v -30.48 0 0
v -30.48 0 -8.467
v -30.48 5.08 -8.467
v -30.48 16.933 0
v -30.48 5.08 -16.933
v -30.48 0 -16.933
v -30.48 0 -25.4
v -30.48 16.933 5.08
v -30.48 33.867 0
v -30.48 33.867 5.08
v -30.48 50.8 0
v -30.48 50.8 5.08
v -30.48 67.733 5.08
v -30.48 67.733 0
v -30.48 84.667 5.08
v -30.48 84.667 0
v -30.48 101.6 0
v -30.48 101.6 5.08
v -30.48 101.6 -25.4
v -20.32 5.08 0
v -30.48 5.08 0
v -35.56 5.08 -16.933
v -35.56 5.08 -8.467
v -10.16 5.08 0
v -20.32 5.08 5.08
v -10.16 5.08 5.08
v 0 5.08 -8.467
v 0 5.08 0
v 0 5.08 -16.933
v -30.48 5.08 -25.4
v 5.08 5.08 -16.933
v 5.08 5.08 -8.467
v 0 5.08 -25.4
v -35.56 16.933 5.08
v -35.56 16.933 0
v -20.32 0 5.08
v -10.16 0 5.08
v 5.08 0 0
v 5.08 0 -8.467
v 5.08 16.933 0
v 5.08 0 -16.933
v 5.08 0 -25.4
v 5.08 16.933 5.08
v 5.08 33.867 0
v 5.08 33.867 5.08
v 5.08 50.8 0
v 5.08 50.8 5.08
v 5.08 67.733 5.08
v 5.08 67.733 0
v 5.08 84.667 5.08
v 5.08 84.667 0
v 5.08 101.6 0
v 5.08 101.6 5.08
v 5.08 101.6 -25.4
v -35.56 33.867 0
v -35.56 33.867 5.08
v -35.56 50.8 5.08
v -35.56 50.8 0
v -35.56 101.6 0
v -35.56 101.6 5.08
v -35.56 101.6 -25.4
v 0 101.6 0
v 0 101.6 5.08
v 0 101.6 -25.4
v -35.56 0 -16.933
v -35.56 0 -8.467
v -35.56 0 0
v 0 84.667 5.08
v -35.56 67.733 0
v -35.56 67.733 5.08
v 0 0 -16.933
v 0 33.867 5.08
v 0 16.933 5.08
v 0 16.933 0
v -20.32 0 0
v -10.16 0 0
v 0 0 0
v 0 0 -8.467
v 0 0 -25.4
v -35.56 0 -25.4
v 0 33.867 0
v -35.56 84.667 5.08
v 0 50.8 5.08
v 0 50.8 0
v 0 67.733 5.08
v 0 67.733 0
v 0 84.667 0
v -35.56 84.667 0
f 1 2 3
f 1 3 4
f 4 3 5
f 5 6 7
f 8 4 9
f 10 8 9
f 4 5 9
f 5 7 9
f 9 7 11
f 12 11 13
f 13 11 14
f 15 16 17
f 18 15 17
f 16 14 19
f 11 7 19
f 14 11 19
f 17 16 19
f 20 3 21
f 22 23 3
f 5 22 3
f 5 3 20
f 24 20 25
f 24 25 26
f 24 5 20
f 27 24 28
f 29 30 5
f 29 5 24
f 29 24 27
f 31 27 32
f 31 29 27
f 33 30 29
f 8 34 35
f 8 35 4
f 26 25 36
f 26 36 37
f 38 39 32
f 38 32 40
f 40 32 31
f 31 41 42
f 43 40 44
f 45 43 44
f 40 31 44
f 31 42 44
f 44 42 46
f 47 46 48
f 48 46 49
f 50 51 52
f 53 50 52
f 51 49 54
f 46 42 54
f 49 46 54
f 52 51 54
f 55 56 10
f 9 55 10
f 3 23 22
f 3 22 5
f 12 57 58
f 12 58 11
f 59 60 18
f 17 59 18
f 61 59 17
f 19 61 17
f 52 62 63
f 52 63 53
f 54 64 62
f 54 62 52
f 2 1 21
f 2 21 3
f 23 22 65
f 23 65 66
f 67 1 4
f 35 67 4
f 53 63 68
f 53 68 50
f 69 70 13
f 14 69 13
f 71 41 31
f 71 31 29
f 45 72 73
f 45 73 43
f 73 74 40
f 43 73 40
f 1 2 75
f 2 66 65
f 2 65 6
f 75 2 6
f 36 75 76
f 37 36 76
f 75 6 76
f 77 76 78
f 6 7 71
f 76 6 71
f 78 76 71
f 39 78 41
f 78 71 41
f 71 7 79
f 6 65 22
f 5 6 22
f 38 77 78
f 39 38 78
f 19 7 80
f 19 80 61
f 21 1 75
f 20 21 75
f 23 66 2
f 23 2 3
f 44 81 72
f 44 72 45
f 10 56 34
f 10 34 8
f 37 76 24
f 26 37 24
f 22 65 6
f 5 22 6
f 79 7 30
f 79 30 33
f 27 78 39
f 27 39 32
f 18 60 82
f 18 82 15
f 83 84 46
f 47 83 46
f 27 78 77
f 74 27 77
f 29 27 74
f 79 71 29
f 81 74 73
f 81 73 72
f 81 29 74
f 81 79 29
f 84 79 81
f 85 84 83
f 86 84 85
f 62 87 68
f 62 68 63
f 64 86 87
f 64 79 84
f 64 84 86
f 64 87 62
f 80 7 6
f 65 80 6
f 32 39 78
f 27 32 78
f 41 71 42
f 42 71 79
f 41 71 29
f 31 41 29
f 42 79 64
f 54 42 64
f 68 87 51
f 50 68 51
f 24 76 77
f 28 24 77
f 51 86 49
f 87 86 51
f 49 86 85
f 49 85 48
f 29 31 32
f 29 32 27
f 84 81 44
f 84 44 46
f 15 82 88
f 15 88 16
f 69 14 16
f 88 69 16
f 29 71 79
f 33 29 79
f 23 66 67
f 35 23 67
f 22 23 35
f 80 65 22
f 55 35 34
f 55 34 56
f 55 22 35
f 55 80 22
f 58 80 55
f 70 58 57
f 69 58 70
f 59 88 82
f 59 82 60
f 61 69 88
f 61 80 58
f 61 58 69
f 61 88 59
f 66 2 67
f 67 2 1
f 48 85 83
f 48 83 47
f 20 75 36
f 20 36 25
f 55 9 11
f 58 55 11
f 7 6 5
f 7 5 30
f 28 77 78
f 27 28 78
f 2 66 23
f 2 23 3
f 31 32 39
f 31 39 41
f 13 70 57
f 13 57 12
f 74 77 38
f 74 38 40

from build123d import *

# Parameters (mm, degrees)
SKETCH1_W           = 30.48
SKETCH1_H           = 25.4
BOSS_EXTRUDE1_DEPTH = 5.08
SKETCH2_W           = 8.466666666
SKETCH2_H           = 5.08
BOSS_EXTRUDE2_DEPTH = 5.08
SKETCH3_W           = 8.466666666
SKETCH3_H           = 5.08
BOSS_EXTRUDE3_DEPTH = 5.08
SKETCH4_W           = 25.4
SKETCH4_H           = 101.6
BOSS_EXTRUDE4_DEPTH = 5.08
SKETCH5_W           = 5.08
SKETCH5_H           = 8.466666666
CUT_EXTRUDE1_DEPTH  = 5.08
CIRPATTERN1_COUNT   = 2
SKETCH6_W           = 10.16
SKETCH6_H           = 5.08
BOSS_EXTRUDE5_DEPTH = 5.08
SKETCH7_W           = 5.08
SKETCH7_H           = 16.933333334
SKETCH7_H_2         = 16.933333333
BOSS_EXTRUDE6_DEPTH = 5.08
SKETCH8_W           = 5.08
SKETCH8_H           = 16.933333334
SKETCH8_H_2         = 16.933333333
BOSS_EXTRUDE7_DEPTH = 5.08


with BuildPart() as part:
    # Sketch1 → Boss-Extrude1 (new body)
    with BuildSketch(Plane(origin=(0, 0, 0), x_dir=(1, 0, 0), z_dir=(0, 1, 0))):
        with Locations((-15.24, 12.7)):
            Rectangle(SKETCH1_W, SKETCH1_H)
    extrude(amount=BOSS_EXTRUDE1_DEPTH)

    # Sketch2 → Boss-Extrude2 (add)
    with BuildSketch(Plane(origin=(0, 0, 0), x_dir=(0, 0, -1), z_dir=(1, 0, 0))):
        with Locations((12.7, 2.54)):
            Rectangle(SKETCH2_W, SKETCH2_H)
    extrude(amount=BOSS_EXTRUDE2_DEPTH)

    # Sketch3 → Boss-Extrude3 (add)
    with BuildSketch(Plane.ZY.offset(30.48)):
        with Locations((-12.7, 2.54)):
            Rectangle(SKETCH3_W, SKETCH3_H)
    extrude(amount=BOSS_EXTRUDE3_DEPTH)

    # Sketch6 → Boss-Extrude5 (add)
    with BuildSketch(Plane.XY):
        with Locations((-15.24, 2.54)):
            Rectangle(SKETCH6_W, SKETCH6_H)
    extrude(amount=BOSS_EXTRUDE5_DEPTH)


with BuildPart() as body_2:
    # Sketch4 → Boss-Extrude4 (new body)
    with BuildSketch(Plane(origin=(5.08, 0, 0), x_dir=(0, 0, -1), z_dir=(1, 0, 0))):
        with Locations((12.7, 50.8)):
            Rectangle(SKETCH4_W, SKETCH4_H)
    extrude(amount=BOSS_EXTRUDE4_DEPTH)

    # Sketch5 → Cut-Extrude1 (cut)
    with BuildSketch(Plane(origin=(0, 0, 0), x_dir=(-1, 0, 0), z_dir=(0, -1, 0))):
        with Locations((-7.62, 12.7)):
            Rectangle(SKETCH5_W, SKETCH5_H)
    extrude(amount=-CUT_EXTRUDE1_DEPTH, mode=Mode.SUBTRACT)


with BuildPart() as body_2_1:
    # Body-Move/Copy1: read off the stored shape, not the designer's step
    # Body-Move/Copy1: moved
    add(body_2.part.moved(Location((-5.08, 0, 0))))


with BuildPart() as cirpattern1_1:
    # CirPattern1: pattern copy
    add(body_2_1.part.rotate(Axis((-15.24, 0, -12.7), (0, 1, 0)), 1 * 360 / CIRPATTERN1_COUNT))

    # Sketch7 → Boss-Extrude6 (add)
    with BuildSketch(Plane.XY):
        with Locations((-33.02, 25.4)):
            Rectangle(SKETCH7_W, SKETCH7_H)
        with Locations((-33.02, 59.266666667)):
            Rectangle(SKETCH7_W, SKETCH7_H_2)
        with Locations((-33.02, 93.133333334)):
            Rectangle(SKETCH7_W, SKETCH7_H_2)
    extrude(amount=BOSS_EXTRUDE6_DEPTH)


with BuildPart() as body_2_2:
    add(body_2_1.part)

    # Sketch8 → Boss-Extrude7 (add)
    with BuildSketch(Plane.XY):
        with Locations((2.54, 25.4)):
            Rectangle(SKETCH8_W, SKETCH8_H)
        with Locations((2.54, 59.266666667)):
            Rectangle(SKETCH8_W, SKETCH8_H_2)
        with Locations((2.54, 93.133333334)):
            Rectangle(SKETCH8_W, SKETCH8_H_2)
    extrude(amount=BOSS_EXTRUDE7_DEPTH)


solid = Compound([part.part, cirpattern1_1.part, body_2_2.part])
